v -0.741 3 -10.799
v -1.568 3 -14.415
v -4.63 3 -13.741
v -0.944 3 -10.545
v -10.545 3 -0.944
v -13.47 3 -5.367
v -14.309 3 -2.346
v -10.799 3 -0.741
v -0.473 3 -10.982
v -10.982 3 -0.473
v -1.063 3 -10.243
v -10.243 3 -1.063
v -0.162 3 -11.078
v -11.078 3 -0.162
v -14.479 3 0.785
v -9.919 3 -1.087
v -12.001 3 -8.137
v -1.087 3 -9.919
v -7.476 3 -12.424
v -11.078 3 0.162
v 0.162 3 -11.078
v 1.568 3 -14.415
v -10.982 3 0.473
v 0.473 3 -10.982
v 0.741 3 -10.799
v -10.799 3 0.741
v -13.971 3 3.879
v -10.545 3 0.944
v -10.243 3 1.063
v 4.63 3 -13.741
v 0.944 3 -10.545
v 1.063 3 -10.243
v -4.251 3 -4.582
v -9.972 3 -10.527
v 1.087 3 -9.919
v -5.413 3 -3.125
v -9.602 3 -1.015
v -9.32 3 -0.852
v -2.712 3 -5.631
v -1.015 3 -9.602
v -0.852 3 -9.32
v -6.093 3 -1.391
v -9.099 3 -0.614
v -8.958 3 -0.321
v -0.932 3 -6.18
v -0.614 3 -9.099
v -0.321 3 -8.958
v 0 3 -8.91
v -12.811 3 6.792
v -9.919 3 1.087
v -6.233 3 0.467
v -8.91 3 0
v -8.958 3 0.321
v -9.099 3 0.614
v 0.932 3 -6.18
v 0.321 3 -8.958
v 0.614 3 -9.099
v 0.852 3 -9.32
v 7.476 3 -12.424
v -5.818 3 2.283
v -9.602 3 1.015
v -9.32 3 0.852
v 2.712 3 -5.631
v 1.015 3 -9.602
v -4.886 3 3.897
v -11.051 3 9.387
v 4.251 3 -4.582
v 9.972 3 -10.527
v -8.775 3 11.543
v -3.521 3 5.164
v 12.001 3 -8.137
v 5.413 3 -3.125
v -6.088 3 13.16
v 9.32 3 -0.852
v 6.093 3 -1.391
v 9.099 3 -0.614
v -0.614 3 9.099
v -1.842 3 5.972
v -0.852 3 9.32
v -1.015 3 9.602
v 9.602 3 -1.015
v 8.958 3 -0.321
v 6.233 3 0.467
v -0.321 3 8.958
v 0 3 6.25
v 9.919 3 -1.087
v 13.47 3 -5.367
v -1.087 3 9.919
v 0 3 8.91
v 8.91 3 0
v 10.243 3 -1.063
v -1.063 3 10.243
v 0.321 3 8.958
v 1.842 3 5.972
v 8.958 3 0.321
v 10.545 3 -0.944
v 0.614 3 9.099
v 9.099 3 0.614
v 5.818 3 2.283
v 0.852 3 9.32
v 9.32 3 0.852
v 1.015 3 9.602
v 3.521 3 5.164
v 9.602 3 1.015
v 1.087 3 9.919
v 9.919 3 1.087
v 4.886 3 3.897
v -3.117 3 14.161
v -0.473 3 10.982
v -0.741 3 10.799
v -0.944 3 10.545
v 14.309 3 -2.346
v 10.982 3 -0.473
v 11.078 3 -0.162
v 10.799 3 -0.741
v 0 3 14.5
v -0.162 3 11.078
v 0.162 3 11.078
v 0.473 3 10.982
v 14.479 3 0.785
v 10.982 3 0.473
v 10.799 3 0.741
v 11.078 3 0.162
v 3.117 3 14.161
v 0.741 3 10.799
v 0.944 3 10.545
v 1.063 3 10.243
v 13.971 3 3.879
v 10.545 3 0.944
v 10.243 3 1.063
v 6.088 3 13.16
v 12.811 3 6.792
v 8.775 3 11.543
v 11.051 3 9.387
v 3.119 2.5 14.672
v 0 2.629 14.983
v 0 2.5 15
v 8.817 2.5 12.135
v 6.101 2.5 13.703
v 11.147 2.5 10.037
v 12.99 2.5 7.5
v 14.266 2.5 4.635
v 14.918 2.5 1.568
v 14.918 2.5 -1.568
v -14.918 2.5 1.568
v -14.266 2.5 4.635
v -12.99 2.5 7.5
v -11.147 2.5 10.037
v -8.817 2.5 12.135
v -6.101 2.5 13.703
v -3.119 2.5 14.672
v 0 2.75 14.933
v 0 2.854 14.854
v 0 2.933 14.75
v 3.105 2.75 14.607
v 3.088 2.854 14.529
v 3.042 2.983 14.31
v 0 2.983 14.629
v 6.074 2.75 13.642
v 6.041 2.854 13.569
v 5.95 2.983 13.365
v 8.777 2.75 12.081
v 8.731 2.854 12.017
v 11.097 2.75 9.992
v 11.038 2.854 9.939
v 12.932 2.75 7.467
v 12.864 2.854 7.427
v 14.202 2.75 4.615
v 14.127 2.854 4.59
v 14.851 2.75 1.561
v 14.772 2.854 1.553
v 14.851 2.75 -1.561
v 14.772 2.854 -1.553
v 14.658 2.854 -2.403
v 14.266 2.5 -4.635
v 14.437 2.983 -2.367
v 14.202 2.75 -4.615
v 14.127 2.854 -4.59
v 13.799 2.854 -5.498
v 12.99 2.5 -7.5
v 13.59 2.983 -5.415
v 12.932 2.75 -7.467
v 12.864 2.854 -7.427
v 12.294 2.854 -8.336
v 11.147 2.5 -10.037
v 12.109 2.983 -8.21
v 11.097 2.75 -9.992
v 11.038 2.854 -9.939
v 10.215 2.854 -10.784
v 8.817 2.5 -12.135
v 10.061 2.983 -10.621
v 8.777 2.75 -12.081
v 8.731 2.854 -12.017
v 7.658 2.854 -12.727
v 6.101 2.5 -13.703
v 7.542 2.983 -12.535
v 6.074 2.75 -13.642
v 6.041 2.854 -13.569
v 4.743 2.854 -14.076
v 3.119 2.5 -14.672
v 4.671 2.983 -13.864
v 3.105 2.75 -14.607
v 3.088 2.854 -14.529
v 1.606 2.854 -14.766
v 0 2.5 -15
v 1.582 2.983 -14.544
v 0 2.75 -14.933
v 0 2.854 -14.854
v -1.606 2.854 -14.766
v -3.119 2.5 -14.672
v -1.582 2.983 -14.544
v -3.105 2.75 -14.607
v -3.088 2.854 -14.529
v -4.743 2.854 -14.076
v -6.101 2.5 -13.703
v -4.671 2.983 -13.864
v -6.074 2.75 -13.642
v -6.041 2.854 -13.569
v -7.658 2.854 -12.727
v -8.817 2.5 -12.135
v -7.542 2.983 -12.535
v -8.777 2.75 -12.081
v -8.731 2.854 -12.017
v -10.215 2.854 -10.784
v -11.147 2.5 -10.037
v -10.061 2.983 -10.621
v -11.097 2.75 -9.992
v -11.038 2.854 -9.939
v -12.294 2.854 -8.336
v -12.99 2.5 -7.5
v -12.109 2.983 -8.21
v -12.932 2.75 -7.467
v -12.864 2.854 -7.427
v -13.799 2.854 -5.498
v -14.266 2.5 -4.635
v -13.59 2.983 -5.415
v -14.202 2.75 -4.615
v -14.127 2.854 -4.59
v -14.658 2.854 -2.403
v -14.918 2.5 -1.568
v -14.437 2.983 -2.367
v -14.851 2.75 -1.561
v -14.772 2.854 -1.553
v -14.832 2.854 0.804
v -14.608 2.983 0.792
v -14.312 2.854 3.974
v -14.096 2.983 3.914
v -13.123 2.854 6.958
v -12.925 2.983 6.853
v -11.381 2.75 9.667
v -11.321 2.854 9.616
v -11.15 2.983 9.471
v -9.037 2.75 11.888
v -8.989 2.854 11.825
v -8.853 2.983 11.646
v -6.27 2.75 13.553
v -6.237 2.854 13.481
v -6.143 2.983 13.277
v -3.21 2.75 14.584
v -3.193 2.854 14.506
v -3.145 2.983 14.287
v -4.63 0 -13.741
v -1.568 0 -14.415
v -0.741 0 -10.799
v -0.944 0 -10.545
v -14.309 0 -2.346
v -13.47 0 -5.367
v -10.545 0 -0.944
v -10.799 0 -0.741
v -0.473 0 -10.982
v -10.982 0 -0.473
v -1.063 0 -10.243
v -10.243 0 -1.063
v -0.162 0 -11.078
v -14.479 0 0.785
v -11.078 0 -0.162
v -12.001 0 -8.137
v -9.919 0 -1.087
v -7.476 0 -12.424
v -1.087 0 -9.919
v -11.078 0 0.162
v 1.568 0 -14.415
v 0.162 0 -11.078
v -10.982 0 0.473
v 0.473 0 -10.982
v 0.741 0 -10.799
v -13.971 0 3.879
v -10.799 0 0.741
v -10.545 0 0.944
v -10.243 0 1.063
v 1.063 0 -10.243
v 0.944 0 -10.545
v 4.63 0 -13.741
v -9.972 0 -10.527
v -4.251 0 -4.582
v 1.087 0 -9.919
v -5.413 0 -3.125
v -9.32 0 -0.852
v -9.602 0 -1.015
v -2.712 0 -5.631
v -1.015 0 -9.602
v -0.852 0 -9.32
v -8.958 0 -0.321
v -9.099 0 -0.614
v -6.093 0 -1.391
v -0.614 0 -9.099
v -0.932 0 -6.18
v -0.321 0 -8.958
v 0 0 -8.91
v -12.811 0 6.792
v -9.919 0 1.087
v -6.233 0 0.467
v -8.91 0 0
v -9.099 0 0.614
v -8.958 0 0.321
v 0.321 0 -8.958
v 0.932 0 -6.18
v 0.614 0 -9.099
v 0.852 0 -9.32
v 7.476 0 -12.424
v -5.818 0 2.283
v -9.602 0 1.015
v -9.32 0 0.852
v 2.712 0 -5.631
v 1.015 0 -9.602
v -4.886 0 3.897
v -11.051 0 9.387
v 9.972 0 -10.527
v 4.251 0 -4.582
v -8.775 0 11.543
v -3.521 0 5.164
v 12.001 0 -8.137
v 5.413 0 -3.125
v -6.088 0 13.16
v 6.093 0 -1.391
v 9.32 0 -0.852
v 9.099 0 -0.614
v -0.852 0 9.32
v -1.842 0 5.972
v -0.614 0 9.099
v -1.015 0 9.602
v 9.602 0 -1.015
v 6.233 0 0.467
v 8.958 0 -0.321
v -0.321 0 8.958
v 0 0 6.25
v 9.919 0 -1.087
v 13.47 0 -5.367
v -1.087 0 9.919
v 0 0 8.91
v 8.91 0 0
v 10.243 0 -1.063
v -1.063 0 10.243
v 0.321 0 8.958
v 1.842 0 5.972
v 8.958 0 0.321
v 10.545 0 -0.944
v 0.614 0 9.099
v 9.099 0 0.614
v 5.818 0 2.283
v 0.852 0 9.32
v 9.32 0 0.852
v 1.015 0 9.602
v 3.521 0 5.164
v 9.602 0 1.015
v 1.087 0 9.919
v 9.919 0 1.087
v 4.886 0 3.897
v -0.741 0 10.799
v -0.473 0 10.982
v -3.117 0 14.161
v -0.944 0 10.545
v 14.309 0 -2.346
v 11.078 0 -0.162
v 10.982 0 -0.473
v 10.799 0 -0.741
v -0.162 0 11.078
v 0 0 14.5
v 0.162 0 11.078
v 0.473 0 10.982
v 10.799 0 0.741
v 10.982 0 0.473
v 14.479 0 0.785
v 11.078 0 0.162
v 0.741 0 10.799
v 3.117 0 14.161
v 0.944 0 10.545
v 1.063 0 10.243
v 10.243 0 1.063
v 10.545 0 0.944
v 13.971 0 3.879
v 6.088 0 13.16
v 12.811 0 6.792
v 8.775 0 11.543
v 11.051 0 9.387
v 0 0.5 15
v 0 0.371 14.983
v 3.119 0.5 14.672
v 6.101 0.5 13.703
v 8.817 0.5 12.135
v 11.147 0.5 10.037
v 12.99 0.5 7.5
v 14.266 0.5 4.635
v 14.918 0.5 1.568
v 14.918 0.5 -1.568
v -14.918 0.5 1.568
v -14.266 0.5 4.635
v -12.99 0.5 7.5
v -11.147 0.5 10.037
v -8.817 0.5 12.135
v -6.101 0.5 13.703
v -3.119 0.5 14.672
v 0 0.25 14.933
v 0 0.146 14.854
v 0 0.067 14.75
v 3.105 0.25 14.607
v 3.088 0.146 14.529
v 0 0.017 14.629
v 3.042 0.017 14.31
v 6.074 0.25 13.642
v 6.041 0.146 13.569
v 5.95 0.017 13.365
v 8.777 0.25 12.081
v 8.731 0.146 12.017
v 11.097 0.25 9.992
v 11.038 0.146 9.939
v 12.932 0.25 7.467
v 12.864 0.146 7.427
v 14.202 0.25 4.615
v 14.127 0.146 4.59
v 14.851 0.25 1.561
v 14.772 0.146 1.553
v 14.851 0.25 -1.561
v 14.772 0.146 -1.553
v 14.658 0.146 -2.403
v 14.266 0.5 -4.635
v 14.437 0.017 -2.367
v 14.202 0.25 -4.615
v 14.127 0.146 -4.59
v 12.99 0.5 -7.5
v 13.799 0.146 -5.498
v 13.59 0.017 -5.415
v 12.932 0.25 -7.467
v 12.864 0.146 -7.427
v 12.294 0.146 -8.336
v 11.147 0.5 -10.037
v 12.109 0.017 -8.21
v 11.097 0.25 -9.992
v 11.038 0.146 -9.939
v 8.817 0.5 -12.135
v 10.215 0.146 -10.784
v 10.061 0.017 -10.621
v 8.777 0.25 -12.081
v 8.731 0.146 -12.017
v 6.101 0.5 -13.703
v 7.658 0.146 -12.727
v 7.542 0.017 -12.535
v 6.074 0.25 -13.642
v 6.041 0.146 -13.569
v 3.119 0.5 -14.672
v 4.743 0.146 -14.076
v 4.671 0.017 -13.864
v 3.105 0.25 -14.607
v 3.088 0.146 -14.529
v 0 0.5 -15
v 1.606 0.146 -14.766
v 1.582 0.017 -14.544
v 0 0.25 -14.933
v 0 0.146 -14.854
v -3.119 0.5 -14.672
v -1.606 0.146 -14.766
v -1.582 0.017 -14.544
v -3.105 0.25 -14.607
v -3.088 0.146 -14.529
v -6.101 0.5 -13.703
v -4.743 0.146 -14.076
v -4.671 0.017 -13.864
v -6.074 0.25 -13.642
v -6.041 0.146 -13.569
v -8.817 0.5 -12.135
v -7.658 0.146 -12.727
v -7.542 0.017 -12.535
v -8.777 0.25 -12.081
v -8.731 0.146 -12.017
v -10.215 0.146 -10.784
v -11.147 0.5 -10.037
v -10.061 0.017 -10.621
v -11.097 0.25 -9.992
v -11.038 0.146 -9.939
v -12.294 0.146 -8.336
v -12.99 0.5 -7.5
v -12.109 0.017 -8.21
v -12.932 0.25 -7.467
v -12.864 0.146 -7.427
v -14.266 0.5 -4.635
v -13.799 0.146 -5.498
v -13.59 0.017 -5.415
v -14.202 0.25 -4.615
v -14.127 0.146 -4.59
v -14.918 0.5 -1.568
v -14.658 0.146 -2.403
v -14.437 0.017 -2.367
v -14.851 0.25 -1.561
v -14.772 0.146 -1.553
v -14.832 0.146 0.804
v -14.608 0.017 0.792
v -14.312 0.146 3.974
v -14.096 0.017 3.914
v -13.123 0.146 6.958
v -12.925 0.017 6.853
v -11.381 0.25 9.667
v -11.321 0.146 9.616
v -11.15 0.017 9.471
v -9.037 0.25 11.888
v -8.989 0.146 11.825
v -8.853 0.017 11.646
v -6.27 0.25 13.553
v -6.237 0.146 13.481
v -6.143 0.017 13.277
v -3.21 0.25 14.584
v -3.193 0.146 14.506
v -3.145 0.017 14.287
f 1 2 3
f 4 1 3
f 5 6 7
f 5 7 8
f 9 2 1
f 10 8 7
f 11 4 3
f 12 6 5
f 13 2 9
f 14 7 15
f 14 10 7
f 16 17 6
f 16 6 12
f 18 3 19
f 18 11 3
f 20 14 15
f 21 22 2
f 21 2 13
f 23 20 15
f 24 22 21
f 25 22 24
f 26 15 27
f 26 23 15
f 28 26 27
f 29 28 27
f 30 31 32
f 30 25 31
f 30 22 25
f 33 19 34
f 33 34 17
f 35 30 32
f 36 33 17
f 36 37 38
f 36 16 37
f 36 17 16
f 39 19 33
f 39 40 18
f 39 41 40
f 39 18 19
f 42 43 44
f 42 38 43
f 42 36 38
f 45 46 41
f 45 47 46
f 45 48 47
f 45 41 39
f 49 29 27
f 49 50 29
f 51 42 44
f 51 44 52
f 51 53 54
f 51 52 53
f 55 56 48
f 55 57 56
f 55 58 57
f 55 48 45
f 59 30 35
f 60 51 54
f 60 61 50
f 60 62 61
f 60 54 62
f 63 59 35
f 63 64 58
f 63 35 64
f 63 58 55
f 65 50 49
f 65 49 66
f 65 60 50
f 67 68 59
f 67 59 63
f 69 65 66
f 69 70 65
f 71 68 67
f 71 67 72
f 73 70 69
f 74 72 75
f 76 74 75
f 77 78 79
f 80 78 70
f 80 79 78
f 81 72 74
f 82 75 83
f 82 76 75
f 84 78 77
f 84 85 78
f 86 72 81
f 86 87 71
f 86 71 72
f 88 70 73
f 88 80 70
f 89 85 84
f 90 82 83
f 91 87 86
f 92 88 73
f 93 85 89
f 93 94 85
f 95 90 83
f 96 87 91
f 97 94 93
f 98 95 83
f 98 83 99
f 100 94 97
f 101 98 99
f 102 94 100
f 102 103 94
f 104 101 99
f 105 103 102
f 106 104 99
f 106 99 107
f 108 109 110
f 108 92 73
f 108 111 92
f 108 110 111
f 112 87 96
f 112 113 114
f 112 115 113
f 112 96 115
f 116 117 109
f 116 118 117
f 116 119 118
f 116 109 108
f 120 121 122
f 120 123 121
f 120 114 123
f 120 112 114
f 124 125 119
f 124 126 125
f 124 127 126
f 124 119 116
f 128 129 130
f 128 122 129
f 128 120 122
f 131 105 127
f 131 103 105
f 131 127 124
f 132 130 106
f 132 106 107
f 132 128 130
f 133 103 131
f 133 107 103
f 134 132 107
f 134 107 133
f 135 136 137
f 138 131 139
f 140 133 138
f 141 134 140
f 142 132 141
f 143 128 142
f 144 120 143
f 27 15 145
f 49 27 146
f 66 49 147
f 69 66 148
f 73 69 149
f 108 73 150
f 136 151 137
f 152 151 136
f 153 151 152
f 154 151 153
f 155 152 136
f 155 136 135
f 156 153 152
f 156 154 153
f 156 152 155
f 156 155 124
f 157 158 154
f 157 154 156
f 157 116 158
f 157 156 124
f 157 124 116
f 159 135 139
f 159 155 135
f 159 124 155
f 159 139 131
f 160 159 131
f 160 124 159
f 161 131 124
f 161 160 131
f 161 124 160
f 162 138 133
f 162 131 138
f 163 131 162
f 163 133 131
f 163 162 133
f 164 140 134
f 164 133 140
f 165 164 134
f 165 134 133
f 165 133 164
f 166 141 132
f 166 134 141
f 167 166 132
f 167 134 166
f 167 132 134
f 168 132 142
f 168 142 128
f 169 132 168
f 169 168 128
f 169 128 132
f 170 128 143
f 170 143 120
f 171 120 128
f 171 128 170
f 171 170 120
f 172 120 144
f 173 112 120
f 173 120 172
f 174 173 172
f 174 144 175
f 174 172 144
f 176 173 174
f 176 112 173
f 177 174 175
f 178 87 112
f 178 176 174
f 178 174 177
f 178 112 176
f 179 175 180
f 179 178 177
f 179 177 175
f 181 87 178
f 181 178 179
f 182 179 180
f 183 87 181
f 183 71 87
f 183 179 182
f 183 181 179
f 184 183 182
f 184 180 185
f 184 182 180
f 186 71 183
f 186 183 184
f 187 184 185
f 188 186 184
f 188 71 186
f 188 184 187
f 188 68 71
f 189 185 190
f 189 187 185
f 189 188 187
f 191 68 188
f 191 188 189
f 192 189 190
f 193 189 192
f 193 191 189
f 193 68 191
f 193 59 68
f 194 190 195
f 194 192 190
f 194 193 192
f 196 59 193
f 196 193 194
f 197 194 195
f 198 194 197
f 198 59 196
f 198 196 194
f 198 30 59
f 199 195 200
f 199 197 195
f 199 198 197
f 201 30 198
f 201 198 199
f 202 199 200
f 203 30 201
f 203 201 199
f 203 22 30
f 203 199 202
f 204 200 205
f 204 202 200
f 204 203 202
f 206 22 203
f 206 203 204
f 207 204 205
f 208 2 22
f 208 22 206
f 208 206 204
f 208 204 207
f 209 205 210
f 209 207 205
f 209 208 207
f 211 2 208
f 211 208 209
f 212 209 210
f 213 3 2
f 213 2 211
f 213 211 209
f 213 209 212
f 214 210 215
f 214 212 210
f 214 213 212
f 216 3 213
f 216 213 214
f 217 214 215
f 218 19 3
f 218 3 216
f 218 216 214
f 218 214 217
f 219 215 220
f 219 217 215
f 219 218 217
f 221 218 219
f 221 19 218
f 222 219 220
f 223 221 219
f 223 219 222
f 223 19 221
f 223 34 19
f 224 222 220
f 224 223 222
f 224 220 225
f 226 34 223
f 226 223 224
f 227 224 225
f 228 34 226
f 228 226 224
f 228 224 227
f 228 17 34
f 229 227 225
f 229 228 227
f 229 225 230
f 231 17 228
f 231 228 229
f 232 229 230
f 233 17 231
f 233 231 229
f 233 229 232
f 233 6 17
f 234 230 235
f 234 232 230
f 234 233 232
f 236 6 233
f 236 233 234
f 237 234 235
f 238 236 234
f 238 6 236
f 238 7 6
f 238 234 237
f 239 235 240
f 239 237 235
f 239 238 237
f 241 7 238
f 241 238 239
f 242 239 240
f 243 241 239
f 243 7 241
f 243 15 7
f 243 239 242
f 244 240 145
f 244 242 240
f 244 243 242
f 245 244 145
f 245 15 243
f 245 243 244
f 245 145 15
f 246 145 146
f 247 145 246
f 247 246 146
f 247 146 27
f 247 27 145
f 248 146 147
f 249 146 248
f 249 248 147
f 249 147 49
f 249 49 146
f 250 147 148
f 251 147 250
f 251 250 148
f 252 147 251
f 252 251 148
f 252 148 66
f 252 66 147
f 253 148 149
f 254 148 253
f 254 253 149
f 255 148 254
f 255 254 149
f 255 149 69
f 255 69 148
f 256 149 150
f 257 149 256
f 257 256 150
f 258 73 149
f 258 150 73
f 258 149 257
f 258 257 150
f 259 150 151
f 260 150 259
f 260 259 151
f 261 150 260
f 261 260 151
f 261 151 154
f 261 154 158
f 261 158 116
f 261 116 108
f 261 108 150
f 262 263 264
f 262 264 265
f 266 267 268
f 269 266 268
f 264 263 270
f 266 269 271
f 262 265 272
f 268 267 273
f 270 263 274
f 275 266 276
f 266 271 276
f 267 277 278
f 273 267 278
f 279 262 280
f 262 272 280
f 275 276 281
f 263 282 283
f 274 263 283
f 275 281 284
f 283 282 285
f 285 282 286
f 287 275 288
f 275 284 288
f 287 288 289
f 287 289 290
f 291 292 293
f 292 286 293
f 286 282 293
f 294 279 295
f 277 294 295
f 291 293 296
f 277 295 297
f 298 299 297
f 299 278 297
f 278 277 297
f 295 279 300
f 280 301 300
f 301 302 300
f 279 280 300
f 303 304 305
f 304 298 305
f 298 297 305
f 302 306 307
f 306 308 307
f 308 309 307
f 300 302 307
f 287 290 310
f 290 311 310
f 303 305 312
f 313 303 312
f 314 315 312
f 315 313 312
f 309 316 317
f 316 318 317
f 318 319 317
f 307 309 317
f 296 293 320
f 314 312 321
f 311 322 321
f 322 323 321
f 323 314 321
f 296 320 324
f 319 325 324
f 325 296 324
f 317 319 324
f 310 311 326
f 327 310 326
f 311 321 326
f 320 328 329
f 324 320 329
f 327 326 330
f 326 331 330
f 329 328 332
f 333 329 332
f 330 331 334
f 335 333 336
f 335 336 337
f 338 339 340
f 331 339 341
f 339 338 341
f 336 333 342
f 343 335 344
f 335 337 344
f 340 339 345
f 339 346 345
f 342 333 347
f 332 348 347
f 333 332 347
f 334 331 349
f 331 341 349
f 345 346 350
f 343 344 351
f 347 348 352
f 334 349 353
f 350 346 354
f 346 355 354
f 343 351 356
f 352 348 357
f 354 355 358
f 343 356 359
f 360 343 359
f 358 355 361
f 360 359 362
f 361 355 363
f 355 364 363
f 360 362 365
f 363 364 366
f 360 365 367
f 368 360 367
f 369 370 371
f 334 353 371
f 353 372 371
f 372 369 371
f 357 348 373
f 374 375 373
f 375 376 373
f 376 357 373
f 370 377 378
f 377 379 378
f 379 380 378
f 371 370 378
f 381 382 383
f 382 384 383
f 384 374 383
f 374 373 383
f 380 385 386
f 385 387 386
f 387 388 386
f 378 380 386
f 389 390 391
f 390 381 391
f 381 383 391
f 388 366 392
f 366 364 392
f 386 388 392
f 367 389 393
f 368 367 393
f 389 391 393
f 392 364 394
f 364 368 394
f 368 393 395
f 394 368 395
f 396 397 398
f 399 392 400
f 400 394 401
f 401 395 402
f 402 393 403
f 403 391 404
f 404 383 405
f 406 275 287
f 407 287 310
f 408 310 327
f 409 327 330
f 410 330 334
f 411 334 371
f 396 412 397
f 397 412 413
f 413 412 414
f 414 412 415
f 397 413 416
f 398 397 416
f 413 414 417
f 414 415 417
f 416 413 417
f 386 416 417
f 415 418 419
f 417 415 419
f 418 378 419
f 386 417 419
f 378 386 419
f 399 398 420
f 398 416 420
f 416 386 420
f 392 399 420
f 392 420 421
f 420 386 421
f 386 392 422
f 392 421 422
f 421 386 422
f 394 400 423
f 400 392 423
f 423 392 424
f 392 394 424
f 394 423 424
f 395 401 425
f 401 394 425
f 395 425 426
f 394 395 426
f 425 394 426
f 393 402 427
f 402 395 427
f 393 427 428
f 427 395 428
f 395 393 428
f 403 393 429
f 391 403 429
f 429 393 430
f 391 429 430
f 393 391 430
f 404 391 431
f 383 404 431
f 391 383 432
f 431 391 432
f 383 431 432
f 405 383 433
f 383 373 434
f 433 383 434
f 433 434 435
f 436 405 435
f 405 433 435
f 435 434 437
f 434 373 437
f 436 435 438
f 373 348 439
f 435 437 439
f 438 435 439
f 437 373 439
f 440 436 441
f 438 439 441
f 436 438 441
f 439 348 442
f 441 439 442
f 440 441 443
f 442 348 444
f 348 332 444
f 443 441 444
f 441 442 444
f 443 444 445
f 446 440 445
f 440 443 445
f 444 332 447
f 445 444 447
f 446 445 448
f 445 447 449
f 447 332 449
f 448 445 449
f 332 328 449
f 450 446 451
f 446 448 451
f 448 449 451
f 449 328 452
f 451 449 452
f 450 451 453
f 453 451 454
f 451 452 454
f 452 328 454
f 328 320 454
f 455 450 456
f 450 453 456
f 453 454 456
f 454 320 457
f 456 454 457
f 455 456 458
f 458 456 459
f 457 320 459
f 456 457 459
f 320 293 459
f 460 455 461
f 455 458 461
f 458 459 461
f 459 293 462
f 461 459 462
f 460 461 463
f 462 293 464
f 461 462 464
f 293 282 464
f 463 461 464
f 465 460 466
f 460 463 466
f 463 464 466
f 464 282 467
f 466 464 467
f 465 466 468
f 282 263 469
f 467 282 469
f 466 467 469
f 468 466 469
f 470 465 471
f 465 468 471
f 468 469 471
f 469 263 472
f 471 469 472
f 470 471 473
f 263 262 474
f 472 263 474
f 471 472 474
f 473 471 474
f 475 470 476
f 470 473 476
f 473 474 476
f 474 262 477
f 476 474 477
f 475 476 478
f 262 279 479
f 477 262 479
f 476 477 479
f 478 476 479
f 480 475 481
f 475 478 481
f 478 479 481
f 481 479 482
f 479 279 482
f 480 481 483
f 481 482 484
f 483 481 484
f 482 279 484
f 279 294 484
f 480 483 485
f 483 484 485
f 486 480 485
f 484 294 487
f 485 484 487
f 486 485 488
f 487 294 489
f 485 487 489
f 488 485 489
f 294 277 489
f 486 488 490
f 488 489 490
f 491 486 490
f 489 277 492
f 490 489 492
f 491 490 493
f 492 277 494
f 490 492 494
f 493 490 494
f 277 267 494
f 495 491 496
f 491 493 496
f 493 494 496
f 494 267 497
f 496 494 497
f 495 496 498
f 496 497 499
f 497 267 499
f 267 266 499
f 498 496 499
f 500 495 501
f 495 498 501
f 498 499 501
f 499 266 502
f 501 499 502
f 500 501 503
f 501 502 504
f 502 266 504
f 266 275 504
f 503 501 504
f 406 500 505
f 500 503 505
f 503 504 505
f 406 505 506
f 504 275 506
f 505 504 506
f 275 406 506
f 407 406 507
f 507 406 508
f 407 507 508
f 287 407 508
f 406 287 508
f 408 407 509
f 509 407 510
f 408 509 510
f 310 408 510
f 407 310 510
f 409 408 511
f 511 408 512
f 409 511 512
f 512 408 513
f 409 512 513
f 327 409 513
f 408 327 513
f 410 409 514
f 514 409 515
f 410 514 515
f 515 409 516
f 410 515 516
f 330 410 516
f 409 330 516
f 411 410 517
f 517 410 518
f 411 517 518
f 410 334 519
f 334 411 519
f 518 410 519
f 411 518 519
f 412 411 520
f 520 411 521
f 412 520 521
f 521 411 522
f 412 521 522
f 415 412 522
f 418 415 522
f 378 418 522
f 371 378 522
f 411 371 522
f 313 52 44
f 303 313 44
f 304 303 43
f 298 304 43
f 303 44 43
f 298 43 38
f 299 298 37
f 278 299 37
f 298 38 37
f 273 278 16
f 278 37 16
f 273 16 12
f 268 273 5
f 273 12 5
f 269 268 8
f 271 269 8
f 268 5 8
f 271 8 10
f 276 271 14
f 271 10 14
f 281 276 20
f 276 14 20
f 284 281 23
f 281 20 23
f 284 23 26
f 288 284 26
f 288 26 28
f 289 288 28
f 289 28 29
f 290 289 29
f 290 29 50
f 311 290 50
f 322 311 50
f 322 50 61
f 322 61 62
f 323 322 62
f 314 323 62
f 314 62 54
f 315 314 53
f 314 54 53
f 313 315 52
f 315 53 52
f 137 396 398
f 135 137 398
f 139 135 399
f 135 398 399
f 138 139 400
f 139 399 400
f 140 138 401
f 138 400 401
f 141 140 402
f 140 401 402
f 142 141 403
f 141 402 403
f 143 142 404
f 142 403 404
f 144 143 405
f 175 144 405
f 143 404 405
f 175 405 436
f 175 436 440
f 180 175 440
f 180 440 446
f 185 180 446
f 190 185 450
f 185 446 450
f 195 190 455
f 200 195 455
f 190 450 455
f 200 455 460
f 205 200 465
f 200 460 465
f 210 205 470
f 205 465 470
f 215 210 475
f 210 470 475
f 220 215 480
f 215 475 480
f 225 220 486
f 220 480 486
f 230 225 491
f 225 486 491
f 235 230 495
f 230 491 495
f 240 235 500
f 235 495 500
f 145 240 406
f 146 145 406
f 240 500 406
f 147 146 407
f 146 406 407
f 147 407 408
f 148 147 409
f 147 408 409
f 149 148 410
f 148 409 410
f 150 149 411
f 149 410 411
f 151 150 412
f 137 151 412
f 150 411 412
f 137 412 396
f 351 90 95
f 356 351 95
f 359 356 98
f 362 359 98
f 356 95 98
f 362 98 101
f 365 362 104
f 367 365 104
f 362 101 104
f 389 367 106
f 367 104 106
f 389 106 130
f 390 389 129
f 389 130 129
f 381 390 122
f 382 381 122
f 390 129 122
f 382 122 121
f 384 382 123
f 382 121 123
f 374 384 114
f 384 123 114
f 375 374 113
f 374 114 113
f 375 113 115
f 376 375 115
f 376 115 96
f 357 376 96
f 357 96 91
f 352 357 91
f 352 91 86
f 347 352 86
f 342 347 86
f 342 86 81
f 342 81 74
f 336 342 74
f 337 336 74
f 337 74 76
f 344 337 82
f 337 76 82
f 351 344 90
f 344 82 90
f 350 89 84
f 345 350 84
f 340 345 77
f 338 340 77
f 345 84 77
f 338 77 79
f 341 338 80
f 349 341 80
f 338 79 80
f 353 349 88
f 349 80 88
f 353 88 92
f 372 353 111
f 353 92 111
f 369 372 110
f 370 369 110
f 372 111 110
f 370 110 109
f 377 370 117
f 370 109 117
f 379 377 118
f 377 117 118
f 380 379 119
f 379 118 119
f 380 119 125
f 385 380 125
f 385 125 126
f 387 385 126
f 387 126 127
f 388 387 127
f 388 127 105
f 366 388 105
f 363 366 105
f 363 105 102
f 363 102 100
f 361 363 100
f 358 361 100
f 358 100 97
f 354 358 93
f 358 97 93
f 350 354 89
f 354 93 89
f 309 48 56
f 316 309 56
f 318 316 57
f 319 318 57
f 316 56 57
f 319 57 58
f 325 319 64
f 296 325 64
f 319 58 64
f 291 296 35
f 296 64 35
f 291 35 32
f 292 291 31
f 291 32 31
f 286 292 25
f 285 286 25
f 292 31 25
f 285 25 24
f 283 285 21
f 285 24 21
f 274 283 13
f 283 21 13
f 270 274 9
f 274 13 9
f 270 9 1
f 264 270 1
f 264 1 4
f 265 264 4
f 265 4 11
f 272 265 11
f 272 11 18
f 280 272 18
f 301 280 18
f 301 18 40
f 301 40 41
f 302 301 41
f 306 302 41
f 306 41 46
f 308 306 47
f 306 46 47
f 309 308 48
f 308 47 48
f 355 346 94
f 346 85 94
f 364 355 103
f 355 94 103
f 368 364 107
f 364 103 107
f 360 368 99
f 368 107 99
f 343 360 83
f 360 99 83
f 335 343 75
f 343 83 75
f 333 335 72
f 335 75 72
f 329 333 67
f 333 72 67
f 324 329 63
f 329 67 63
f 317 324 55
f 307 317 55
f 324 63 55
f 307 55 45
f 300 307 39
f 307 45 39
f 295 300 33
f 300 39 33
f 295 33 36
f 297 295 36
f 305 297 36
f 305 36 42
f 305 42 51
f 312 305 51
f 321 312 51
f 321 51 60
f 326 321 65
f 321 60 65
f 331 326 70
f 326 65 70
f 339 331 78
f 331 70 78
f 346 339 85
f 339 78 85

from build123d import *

# Parameters (mm, degrees)
SKETCH1_R           = 15
BOSS_EXTRUDE1_DEPTH = 3
SKETCH2_R           = 1.09
CUT_EXTRUDE1_DEPTH  = 3
CIRPATTERN1_COUNT   = 4
FILLET1_R           = 0.5
SKETCH5_R           = 6.25
CUT_EXTRUDE2_DEPTH  = 25


with BuildPart() as part:
    # Sketch1 → Boss-Extrude1 (new body)
    with BuildSketch(Plane(origin=(0, 0, 0), x_dir=(1, 0, 0), z_dir=(0, 1, 0))):
        with Locations(Location((0, 0, 0), (0, 0, 270))):
            Circle(SKETCH1_R)
    extrude(amount=BOSS_EXTRUDE1_DEPTH)

    # Sketch2 → Cut-Extrude1 (cut)
    with BuildSketch(Plane(origin=(0, 3, 0), x_dir=(1, 0, 0), z_dir=(0, 1, 0))):
        with Locations(Location((0, 10, 0), (0, 0, 270))):
            Circle(SKETCH2_R)
    cut_extrude1 = extrude(amount=-CUT_EXTRUDE1_DEPTH, mode=Mode.SUBTRACT)

    # CirPattern1: Cut-Extrude1 ×4 about axis
    cirpattern1_axis = Axis((0, 0, 0), (0, 1, 0))
    for i in range(1, CIRPATTERN1_COUNT):
        add(cut_extrude1.rotate(cirpattern1_axis, i * 360 / CIRPATTERN1_COUNT), mode=Mode.SUBTRACT)

    # Fillet1
    fillet1_edges = [part.edges().sort_by_distance(p)[0] for p in [
        (0, 0, -15),
        (0, 3, -15),
    ]]
    fillet(fillet1_edges, radius=FILLET1_R)

    # Sketch5 → Cut-Extrude2 (cut, symmetric)
    with BuildSketch(Plane(origin=(0, 3, 0), x_dir=(1, 0, 0), z_dir=(0, 1, 0))):
        with Locations(Location((0, 0, 0), (0, 0, 270))):
            Circle(SKETCH5_R)
    extrude(amount=CUT_EXTRUDE2_DEPTH, both=True, mode=Mode.SUBTRACT)


solid = part.part
